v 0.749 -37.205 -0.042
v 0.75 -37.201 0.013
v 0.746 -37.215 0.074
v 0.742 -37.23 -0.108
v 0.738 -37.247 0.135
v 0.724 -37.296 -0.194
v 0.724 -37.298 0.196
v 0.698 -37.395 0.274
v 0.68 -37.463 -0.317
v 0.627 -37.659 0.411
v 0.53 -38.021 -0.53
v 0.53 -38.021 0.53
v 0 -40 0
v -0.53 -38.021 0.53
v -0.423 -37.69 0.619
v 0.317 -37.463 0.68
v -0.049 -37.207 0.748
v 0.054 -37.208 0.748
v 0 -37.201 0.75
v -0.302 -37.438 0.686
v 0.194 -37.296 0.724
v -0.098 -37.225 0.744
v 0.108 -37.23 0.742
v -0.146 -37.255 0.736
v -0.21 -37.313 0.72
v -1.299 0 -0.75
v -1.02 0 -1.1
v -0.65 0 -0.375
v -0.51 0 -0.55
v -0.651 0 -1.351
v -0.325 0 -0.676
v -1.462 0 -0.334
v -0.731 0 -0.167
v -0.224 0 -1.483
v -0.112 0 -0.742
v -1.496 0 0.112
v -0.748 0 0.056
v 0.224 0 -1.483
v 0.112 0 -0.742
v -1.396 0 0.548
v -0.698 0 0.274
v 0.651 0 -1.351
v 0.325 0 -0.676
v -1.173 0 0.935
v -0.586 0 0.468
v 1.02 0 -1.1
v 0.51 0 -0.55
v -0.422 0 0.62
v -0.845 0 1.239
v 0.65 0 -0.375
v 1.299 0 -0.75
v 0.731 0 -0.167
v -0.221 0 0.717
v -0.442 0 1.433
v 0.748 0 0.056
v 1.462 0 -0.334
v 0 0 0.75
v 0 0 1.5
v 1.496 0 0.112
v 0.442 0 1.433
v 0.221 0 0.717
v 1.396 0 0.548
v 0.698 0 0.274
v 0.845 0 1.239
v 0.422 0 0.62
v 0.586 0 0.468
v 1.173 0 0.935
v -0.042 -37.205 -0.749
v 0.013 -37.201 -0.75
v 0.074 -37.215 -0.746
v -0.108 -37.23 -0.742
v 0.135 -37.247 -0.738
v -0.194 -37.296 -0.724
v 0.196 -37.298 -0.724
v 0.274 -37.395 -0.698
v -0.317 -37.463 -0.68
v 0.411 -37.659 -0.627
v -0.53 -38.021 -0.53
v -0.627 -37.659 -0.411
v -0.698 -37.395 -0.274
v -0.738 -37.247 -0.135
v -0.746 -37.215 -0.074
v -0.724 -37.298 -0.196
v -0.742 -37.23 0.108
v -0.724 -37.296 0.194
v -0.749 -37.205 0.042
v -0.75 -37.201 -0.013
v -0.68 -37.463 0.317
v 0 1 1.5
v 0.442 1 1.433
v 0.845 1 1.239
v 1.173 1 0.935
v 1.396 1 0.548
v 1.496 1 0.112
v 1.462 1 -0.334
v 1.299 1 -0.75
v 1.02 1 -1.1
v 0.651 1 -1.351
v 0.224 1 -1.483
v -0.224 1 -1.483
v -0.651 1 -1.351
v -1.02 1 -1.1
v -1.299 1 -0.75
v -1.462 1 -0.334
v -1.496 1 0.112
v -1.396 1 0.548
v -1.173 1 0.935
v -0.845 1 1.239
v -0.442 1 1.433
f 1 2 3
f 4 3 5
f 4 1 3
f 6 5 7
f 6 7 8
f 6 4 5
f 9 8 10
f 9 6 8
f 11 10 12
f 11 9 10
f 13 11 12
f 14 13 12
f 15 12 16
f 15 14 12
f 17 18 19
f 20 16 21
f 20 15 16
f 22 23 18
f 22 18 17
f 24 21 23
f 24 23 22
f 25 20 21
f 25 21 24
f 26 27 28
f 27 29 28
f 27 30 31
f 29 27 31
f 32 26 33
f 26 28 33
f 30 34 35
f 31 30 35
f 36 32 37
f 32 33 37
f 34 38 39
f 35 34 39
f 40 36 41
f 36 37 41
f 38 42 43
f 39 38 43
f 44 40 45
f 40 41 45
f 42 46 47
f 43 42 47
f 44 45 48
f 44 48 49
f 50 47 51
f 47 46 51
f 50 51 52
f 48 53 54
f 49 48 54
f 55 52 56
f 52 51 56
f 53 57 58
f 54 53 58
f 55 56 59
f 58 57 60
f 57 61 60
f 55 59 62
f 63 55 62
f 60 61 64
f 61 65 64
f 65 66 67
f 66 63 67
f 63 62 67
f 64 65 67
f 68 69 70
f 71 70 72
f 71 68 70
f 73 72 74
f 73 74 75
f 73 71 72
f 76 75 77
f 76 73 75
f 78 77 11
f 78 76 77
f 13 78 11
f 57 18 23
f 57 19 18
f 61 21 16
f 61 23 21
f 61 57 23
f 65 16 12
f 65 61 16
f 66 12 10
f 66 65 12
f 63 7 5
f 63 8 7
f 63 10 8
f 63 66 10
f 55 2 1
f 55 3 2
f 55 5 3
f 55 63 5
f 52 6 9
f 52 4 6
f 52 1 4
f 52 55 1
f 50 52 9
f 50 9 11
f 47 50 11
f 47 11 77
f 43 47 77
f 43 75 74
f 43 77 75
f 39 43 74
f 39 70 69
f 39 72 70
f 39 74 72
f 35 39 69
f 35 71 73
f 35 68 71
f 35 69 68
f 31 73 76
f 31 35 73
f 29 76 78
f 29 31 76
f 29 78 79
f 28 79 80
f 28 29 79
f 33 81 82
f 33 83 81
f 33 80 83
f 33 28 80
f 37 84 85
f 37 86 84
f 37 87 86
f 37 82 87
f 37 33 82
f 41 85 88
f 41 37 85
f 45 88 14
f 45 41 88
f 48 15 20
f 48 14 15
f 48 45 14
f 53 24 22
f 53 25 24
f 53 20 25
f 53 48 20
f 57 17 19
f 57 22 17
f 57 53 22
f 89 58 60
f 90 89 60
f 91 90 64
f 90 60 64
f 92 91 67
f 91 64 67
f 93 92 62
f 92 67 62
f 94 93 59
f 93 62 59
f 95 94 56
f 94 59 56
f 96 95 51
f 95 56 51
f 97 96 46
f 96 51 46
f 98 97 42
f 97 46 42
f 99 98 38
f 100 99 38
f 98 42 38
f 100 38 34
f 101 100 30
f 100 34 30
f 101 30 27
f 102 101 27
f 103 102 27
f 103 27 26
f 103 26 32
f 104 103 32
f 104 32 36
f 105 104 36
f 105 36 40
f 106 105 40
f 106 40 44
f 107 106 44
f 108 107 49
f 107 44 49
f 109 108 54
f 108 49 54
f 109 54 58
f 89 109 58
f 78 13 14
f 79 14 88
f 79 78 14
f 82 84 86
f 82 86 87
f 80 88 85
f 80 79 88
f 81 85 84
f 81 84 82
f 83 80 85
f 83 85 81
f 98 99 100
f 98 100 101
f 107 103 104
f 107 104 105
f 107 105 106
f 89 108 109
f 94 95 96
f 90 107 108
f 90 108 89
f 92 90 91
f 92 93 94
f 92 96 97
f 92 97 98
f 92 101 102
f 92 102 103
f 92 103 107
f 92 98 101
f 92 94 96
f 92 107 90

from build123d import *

# Parameters (mm, degrees)
SKETCH_1_R               = 0.75
EXTRUDE_1_DEPTH          = 40
SKETCH_2_R               = 1.5
EXTRUDE_2_DEPTH          = 1
CUT_EXTRUDE_2_DEPTH      = 41.056210505
CUT_EXTRUDE_2_DEPTH_BACK = 41.056210505
CUT_EXTRUDE_3_DEPTH      = 41.056210505
CUT_EXTRUDE_3_DEPTH_BACK = 41.056210505


with BuildPart() as part:
    # Эскиз1 → Бобышка-Вытянуть1 (new body)
    with BuildSketch(Plane(origin=(0, 0, 0), x_dir=(1, 0, 0), z_dir=(0, 1, 0))):
        with Locations(Location((0, 0, 0), (0, 0, 270))):
            Circle(SKETCH_1_R)
    extrude(amount=-EXTRUDE_1_DEPTH)

    # Эскиз2 → Бобышка-Вытянуть2 (add)
    with BuildSketch(Plane(origin=(0, 0, 0), x_dir=(1, 0, 0), z_dir=(0, 1, 0))):
        with Locations(Location((0, 0, 0), (0, 0, 270))):
            Circle(SKETCH_2_R)
    extrude(amount=EXTRUDE_2_DEPTH)

    # Эскиз5 → Вырез-Вытянуть2 (cut, two sides: drawn at the far end of the back side and taken through both)
    with BuildSketch(Plane(origin=(0, 0, 0), x_dir=(0, 0, -1), z_dir=(1, 0, 0)).offset(-CUT_EXTRUDE_2_DEPTH_BACK)):
        Polygon((-1.201318644, -35.516617784), (-1.201318644, -40.516617784), (1.201318644, -40.516617784), (1.201318644, -35.516617784), (0, -40), align=None)
    extrude(amount=CUT_EXTRUDE_2_DEPTH + CUT_EXTRUDE_2_DEPTH_BACK, mode=Mode.SUBTRACT)

    # Эскиз7 → Вырез-Вытянуть3 (cut, two sides: drawn at the far end of the back side and taken through both)
    with BuildSketch(Plane.XY.offset(-CUT_EXTRUDE_3_DEPTH_BACK)):
        Polygon((-1.267511878, -35.269581272), (-1.267511878, -40.269581272), (1.267511878, -40.269581272), (1.267511878, -35.269581272), (0, -40), align=None)
    extrude(amount=CUT_EXTRUDE_3_DEPTH + CUT_EXTRUDE_3_DEPTH_BACK, mode=Mode.SUBTRACT)


solid = part.part
